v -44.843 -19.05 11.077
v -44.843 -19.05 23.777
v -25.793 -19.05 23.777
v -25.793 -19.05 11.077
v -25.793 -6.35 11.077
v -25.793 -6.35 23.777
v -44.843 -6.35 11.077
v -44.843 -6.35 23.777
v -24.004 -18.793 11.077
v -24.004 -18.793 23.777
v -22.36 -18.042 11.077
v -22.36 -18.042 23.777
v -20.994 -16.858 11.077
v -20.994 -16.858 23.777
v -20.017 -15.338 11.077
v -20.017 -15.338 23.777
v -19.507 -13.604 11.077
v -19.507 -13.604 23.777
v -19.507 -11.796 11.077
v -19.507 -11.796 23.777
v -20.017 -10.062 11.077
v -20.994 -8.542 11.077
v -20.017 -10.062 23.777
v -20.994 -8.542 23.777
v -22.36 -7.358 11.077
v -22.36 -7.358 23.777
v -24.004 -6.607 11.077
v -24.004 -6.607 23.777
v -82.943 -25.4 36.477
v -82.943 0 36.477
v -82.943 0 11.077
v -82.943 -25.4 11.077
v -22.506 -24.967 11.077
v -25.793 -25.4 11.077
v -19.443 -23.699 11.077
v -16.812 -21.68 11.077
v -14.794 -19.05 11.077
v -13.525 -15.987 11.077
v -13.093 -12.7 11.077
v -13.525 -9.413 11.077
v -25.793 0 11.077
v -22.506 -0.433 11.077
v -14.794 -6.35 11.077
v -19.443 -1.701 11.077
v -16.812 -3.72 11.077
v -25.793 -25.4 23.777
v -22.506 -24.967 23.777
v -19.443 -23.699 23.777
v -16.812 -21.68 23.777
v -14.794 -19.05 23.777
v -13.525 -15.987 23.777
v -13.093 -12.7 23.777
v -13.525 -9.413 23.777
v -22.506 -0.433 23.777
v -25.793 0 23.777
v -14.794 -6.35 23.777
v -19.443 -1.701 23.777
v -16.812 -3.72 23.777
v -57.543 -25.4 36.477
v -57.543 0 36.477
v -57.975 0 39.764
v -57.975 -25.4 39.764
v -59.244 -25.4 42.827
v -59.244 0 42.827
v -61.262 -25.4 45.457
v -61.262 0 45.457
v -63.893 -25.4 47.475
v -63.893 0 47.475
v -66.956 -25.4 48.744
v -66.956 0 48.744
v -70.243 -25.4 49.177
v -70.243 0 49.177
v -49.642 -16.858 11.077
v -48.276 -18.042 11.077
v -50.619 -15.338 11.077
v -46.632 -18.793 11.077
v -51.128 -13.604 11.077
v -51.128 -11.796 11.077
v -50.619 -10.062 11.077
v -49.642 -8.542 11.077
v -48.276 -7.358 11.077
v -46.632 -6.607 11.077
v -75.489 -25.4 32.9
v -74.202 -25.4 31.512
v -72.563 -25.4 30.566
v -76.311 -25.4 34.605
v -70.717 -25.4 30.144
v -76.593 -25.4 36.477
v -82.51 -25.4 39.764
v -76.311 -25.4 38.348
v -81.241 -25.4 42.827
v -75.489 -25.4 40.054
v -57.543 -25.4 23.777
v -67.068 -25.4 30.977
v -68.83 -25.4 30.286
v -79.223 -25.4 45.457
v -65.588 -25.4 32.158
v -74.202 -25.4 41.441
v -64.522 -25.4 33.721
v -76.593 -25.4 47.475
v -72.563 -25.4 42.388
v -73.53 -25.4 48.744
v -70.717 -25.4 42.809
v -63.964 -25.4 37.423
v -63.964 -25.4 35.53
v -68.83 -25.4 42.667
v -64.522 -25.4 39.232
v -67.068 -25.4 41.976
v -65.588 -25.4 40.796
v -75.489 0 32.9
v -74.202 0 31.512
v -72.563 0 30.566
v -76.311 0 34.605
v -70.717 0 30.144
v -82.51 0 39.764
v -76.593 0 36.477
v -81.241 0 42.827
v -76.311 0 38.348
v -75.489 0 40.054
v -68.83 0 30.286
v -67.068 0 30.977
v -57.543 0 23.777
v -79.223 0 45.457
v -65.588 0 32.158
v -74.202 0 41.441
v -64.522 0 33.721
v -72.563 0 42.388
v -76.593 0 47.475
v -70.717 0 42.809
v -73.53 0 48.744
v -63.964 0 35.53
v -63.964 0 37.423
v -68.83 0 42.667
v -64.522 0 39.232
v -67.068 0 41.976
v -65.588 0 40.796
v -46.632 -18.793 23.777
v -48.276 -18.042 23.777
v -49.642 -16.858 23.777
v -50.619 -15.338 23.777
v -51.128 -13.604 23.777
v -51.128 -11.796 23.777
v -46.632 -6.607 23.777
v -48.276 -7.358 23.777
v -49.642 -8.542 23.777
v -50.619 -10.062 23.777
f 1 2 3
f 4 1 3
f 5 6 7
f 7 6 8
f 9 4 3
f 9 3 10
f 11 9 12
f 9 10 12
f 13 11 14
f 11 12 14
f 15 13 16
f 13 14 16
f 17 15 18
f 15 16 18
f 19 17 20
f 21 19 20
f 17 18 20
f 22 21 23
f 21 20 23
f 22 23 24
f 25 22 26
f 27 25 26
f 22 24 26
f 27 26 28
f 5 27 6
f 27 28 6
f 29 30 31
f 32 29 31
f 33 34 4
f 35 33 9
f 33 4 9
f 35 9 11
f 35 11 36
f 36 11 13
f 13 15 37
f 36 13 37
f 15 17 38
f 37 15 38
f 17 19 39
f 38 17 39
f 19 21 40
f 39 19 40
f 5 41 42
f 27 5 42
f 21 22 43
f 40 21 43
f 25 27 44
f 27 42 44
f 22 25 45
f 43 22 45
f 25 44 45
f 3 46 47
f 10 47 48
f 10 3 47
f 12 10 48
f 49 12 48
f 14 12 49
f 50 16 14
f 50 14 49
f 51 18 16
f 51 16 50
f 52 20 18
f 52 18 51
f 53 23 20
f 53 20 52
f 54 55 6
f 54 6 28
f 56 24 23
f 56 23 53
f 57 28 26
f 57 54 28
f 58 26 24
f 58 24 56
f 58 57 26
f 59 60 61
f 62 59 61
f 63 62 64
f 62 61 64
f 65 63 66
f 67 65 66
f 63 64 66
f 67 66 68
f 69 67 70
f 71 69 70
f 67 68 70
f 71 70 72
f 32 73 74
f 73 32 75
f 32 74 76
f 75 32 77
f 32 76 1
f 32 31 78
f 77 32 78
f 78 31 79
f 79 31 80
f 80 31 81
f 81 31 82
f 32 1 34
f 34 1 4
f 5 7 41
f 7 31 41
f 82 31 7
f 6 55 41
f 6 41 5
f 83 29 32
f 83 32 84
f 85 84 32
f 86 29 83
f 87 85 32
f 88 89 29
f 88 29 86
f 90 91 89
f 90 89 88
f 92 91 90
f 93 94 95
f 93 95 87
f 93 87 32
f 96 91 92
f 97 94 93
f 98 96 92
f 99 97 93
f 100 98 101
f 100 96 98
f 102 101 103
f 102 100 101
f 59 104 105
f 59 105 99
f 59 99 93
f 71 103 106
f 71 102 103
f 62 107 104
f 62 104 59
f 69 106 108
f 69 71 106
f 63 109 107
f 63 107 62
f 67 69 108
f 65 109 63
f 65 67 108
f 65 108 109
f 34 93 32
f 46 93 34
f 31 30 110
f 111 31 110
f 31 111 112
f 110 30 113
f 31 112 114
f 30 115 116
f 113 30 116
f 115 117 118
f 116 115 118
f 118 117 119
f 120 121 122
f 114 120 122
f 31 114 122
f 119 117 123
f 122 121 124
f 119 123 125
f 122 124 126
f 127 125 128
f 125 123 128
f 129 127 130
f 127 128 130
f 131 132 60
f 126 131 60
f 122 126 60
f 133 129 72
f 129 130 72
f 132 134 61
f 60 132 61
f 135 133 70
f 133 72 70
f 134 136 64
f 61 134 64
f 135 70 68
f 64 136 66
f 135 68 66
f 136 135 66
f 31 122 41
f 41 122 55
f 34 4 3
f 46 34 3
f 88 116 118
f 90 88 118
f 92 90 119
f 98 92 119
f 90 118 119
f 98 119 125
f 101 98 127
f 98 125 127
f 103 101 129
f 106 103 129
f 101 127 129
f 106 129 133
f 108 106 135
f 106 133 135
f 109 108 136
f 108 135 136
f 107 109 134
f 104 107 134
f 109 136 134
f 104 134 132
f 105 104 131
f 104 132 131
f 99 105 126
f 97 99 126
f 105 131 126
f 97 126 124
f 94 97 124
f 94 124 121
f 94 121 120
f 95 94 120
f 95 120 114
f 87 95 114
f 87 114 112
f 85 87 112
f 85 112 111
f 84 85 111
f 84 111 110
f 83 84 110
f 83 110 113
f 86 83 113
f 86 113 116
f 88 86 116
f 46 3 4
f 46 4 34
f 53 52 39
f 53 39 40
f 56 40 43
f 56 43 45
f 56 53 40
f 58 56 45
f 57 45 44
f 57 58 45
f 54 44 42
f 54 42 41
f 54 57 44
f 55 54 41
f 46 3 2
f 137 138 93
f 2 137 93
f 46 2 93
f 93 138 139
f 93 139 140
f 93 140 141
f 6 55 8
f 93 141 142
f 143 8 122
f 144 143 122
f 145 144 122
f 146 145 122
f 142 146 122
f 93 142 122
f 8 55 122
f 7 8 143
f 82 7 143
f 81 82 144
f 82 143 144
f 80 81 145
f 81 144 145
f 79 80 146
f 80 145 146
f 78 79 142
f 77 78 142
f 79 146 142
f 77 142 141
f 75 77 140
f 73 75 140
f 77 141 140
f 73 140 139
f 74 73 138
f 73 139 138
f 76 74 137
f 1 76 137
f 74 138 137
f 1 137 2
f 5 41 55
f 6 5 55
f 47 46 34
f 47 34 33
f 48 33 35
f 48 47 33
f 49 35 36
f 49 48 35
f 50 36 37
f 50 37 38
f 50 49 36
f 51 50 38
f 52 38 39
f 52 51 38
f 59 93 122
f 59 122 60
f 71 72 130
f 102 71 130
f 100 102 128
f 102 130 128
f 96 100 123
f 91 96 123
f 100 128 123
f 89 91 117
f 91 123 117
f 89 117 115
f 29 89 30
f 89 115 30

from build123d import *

# Parameters (mm, degrees)
F1_DEPTH = 25.4
F3_DEPTH = 12.7
F5_D     = 12.7
F7_DEPTH = 25.4


# Not quite as in the source:
# - ends of sketch curves that miss each other by under 0.0002 mm in the source are joined


with BuildPart() as f1:
    # F0 (on Front) → F1 (new body)
    with BuildSketch(Plane.XZ):
        Polygon((-70.2426877682, 36.4766385419), (-82.9426877682, 36.4766391127), (-82.9426877682, 11.0766391127), (-25.7926877682, 11.0766391127), (-25.7926877682, 23.776637971), (-57.5426877682, 23.776637971), (-57.5426877682, 36.476637971), align=None)
        with BuildLine():
            Line((-70.2426871973, 49.176637971), (-70.2426877682, 36.476637971))
            Line((-70.2426877682, 36.476637971), (-57.5426877682, 36.476637971))
            ThreePointArc((-57.5426877682, 36.476637971), (-61.2624314453, 45.4568938903), (-70.2426871973, 49.176637971))
        make_face()
        with BuildLine():
            ThreePointArc((-70.2426871973, 49.176637971), (-79.2229432838, 45.4568946976), (-82.9426877682, 36.4766391127))
            Line((-82.9426877682, 36.4766391127), (-70.2426877682, 36.4766385419))
            Line((-70.2426877682, 36.4766385419), (-70.2426871973, 49.176637971))
        make_face()
    extrude(amount=F1_DEPTH)

    # F5 (through all)
    with Locations(Plane.XZ.offset(25.4)):
        with Locations((-70.2426877682, 36.476637971)):
            Hole(F5_D / 2)


with BuildPart() as f3:
    # F2 (on face) → F3 (new body)
    with BuildSketch(Plane.XY.offset(23.776637971)):
        with BuildLine():
            Line((-25.7926877682, -12.7), (-13.0926877682, -12.7))
            ThreePointArc((-13.0926877682, -12.7), (-16.8124316471, -3.7197438789), (-25.7926877682, 0))
            Line((-25.7926877682, 0), (-25.7926877682, -12.7))
        make_face()
        with BuildLine():
            Line((-25.7926877682, -12.7), (-25.7926877682, -25.4))
            ThreePointArc((-25.7926877682, -25.4), (-16.8124316471, -21.6802561211), (-13.0926877682, -12.7))
            Line((-13.0926877682, -12.7), (-25.7926877682, -12.7))
        make_face()
    extrude(amount=-F3_DEPTH)


with BuildPart() as f7_tool:
    # F6 (on face) → F7 (new body)
    with BuildSketch(Plane.XY.offset(23.776637971)):
        with BuildLine():
            ThreePointArc((-25.7926877682, -19.0500009306), (-19.4426877682, -12.7000009306), (-25.7926877682, -6.3500009306))
            Line((-25.7926877682, -6.3500009306), (-25.7926877682, -19.0500009306))
        make_face()
        Polygon((-25.7926877682, -6.3500009306), (-44.8426877682, -6.35), (-44.8426877682, -19.0500009306), (-25.7926877682, -19.0500009306), align=None)
        with BuildLine():
            Line((-44.8426877682, -19.0500009306), (-44.8426877682, -6.35))
            ThreePointArc((-44.8426877682, -6.35), (-51.1926885437, -12.7000004653), (-44.8426877682, -19.0500009306))
        make_face()
    extrude(amount=-F7_DEPTH)


with BuildPart() as f1_1:
    add(f1.part)

    # F7: cut by f7_tool
    add(f7_tool.part, mode=Mode.SUBTRACT)


with BuildPart() as f3_1:
    add(f3.part)

    # F7: cut by f7_tool
    add(f7_tool.part, mode=Mode.SUBTRACT)


solid = Compound([f1_1.part, f3_1.part])
